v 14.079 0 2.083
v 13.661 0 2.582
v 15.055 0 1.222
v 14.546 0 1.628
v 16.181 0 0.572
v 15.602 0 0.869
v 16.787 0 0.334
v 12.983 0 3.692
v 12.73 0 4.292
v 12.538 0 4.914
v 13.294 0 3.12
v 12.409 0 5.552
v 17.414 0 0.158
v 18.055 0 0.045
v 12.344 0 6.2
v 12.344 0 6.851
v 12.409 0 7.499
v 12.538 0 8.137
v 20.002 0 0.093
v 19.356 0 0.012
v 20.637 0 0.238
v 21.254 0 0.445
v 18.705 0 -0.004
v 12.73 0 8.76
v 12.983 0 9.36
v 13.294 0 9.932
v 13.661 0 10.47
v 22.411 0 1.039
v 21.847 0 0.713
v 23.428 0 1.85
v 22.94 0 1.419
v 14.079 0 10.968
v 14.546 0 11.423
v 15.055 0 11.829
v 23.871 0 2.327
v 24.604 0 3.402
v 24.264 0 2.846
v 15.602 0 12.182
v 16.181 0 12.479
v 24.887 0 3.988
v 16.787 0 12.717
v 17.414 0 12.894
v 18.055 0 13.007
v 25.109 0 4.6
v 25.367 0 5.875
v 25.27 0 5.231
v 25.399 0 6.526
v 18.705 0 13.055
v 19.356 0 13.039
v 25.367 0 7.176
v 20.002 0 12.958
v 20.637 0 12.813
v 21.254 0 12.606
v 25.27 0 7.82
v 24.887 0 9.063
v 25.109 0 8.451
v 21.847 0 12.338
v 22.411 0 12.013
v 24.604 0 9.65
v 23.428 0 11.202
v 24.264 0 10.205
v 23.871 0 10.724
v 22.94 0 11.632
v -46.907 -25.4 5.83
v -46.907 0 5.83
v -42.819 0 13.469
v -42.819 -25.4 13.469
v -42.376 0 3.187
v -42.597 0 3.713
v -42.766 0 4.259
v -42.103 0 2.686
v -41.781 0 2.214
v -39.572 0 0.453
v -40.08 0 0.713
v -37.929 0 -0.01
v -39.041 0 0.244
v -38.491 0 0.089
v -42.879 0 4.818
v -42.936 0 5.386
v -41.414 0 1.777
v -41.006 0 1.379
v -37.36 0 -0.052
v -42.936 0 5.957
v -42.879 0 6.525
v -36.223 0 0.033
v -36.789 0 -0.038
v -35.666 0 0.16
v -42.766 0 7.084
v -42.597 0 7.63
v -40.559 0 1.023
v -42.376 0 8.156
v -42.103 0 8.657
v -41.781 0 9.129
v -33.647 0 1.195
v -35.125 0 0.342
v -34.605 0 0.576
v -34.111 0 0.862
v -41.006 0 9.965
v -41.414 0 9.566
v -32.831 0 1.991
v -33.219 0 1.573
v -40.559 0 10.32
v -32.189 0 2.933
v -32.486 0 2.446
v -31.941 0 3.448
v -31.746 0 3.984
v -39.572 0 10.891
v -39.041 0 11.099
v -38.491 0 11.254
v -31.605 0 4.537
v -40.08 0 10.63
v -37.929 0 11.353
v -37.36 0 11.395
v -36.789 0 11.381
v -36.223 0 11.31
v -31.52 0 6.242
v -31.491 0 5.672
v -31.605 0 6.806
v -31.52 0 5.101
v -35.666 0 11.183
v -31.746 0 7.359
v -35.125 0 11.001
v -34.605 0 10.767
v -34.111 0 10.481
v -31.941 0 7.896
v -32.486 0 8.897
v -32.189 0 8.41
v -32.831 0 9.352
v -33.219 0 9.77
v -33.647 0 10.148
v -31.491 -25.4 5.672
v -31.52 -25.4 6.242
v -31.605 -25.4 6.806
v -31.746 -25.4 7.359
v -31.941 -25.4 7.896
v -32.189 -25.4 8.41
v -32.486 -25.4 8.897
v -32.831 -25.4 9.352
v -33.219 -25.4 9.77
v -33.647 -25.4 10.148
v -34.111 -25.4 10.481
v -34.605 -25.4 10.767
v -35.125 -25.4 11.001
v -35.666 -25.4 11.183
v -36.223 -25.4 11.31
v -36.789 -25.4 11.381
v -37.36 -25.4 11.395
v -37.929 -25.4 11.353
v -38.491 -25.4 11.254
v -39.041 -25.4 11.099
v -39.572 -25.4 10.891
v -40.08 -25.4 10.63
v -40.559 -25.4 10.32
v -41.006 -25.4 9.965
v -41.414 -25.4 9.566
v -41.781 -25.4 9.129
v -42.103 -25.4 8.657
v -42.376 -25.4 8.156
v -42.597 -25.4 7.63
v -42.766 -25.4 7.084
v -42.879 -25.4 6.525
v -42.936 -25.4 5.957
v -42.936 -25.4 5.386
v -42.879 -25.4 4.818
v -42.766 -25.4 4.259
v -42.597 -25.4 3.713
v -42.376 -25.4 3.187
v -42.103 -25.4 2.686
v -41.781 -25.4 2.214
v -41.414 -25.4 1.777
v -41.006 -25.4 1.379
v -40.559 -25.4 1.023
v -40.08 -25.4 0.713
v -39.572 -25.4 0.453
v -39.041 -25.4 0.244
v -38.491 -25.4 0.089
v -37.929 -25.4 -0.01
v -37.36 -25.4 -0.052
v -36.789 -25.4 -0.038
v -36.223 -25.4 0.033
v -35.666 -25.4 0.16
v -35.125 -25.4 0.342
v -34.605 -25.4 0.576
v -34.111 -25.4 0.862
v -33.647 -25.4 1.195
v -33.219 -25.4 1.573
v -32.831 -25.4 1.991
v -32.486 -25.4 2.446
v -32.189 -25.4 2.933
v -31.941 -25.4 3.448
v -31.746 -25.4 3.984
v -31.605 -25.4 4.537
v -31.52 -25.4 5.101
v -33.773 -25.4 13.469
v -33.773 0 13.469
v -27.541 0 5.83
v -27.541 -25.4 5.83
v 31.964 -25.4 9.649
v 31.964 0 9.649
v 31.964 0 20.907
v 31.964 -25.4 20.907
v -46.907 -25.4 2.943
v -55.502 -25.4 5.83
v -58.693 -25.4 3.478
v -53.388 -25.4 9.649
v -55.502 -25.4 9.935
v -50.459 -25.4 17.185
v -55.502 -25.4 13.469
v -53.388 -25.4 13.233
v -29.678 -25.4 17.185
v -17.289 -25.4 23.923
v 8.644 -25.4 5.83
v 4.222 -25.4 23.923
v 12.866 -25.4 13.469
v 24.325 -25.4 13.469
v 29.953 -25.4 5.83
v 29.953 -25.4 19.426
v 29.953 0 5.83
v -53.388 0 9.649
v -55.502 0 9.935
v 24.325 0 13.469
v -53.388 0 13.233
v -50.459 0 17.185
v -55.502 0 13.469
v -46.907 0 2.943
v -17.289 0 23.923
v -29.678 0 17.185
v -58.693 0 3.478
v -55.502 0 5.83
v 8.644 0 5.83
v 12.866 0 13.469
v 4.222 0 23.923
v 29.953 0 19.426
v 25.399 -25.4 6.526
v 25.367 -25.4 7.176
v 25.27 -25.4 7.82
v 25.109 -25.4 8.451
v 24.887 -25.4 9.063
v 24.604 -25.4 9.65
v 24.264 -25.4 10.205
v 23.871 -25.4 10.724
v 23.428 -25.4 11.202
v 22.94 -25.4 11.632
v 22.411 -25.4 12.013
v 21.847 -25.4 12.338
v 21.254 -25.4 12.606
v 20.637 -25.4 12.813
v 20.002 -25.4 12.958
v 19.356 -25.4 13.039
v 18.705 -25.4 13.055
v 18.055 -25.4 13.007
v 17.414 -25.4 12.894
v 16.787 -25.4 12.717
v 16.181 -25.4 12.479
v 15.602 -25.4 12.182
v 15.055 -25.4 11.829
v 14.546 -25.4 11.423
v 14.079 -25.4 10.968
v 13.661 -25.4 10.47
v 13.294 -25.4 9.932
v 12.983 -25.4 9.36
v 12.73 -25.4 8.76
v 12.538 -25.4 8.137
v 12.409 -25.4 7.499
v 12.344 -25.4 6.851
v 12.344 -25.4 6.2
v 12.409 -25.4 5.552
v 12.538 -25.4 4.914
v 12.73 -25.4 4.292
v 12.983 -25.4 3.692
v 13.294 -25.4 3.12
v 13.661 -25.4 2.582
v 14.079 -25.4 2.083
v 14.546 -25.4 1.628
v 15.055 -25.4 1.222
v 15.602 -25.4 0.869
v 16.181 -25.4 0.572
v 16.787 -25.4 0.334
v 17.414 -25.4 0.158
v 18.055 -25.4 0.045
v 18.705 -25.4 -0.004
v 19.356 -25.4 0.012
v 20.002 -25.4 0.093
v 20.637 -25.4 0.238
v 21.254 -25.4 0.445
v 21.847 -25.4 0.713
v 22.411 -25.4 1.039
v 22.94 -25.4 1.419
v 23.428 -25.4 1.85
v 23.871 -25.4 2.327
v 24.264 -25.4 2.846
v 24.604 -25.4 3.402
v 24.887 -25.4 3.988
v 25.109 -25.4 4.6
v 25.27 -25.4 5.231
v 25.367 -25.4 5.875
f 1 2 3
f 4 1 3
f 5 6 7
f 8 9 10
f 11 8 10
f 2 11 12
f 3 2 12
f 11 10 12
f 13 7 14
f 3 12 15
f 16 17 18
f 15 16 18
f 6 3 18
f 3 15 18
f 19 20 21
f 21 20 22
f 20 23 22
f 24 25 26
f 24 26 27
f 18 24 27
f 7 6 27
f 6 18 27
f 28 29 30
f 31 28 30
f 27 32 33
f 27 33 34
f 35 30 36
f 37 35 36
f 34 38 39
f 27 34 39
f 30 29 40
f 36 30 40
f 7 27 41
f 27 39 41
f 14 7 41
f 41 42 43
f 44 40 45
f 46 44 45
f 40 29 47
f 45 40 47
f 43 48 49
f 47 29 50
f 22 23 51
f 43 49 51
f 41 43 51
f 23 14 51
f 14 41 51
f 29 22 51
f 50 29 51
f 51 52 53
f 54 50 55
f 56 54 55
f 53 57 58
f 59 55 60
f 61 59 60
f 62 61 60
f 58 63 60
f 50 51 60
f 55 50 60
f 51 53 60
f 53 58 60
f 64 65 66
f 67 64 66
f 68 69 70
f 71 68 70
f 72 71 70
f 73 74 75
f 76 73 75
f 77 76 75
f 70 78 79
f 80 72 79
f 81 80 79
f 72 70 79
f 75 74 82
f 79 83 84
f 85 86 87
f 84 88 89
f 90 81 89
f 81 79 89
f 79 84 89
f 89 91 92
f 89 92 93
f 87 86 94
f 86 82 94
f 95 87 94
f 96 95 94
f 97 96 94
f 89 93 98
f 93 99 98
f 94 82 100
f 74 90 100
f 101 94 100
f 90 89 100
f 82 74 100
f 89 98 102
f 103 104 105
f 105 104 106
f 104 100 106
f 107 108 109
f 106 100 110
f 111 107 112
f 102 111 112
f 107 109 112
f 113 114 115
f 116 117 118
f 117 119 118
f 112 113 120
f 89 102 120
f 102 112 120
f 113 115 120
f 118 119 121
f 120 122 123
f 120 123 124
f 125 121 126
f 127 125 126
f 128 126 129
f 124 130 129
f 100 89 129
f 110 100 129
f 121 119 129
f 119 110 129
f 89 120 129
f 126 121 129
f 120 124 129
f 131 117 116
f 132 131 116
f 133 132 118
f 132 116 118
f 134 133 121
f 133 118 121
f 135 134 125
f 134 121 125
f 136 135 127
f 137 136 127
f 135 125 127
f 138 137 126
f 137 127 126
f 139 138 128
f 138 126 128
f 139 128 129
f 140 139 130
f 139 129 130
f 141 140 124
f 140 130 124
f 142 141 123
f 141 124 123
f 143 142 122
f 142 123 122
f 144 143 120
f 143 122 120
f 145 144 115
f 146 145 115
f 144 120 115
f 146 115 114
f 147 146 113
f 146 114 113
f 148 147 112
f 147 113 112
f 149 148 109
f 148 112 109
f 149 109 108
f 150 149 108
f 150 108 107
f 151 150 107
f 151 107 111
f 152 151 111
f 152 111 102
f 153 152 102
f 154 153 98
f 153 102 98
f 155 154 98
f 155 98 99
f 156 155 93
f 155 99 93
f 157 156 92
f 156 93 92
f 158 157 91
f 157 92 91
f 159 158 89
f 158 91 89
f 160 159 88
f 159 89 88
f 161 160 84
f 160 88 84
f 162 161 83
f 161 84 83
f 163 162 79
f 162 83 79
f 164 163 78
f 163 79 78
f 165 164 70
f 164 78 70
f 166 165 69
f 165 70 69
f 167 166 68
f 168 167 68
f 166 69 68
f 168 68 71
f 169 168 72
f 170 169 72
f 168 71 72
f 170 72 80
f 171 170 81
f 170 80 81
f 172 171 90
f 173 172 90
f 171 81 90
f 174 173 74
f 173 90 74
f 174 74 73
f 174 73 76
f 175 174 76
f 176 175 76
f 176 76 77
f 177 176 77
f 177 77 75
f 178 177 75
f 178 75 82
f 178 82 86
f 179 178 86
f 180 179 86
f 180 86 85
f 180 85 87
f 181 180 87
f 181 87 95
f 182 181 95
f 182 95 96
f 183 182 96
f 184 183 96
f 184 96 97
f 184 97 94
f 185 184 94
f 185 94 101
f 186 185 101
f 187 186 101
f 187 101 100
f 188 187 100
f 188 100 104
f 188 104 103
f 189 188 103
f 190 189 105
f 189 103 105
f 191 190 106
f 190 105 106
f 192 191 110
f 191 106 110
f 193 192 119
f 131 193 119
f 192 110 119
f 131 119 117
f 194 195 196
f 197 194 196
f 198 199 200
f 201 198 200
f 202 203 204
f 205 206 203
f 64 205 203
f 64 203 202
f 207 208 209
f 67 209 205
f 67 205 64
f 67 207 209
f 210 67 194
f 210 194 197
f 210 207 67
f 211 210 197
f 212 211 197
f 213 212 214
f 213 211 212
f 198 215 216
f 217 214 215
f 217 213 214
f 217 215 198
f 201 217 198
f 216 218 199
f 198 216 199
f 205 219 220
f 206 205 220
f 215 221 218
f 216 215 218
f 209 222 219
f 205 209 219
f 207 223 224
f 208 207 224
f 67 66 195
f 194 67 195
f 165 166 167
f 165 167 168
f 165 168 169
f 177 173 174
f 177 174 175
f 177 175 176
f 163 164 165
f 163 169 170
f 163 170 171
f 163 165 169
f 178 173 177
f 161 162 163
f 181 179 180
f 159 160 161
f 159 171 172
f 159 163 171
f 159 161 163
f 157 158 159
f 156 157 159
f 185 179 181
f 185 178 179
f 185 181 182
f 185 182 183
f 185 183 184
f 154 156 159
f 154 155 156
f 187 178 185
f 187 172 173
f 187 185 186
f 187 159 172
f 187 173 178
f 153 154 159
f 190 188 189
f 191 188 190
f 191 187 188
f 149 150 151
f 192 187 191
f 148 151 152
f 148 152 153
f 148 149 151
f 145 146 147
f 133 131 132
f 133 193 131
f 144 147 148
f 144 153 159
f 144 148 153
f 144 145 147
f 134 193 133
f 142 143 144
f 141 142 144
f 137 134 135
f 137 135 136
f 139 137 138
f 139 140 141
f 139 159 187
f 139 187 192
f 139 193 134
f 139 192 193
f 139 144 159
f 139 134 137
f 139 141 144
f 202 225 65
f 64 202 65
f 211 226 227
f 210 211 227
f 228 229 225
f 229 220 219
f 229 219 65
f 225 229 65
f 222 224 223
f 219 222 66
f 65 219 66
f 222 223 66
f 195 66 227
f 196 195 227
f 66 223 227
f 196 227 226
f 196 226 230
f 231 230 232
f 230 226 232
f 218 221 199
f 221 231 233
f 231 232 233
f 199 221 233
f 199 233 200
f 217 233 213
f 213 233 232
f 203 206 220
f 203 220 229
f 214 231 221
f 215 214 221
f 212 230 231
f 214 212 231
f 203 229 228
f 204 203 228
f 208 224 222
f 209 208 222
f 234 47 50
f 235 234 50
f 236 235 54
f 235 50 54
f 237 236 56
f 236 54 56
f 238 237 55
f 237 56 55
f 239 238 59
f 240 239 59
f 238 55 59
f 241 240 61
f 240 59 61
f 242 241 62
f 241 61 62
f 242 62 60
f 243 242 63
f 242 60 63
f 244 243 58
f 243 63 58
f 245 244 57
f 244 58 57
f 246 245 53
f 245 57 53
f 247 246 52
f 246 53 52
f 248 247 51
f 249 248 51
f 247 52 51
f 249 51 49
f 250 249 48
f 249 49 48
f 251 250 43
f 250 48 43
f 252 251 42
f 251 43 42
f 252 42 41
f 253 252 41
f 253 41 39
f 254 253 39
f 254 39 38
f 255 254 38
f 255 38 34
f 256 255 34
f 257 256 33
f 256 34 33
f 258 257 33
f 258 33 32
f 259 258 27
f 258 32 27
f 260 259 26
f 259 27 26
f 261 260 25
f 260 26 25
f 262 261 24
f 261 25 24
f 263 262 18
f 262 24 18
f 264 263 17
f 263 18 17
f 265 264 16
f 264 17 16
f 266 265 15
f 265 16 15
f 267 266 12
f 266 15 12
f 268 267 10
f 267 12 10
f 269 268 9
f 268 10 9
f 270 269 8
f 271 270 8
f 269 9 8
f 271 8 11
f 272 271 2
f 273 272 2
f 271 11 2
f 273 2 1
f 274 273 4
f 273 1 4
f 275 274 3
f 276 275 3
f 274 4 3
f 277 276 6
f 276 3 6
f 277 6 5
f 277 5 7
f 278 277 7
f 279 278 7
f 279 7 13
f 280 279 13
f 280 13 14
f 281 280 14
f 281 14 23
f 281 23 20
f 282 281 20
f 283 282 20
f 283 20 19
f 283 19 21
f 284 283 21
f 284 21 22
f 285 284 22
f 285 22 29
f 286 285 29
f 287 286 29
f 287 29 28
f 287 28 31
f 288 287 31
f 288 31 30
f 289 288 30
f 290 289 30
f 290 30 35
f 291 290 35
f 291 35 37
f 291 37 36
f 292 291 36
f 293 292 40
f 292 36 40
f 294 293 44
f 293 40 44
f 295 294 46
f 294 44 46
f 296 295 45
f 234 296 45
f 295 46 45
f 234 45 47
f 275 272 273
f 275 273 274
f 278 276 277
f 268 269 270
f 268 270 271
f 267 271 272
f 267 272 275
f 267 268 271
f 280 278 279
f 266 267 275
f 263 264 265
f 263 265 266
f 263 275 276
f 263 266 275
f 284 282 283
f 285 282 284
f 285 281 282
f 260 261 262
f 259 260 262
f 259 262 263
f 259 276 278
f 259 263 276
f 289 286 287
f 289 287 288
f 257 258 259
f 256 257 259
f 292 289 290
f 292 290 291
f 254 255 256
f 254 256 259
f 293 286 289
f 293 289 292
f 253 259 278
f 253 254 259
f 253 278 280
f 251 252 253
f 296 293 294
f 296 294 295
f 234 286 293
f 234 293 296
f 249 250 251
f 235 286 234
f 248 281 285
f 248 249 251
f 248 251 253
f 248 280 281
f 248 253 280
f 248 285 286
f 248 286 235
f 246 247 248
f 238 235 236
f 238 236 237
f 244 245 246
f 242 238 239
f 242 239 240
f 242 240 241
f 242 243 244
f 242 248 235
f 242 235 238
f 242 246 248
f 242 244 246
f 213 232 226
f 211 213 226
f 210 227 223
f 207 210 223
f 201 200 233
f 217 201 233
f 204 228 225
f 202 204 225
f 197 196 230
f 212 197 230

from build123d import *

# Parameters (mm, degrees)
F1_DEPTH = 25.4
F2_R     = 5.725648
F3_DEPTH = 25.4
F4_R     = 6.531804
F5_DEPTH = 25.4


with BuildPart() as f1:
    # F0 (on Front) → F1 (new body)
    with BuildSketch(Plane.XZ):
        Polygon((-46.907243, 5.829874), (-42.819422, 13.469021), (-33.773065, 13.469021), (-27.541131, 5.829874), (8.644298, 5.829874), (12.865931, 13.469021), (24.324648, 13.469021), (29.953493, 5.829874), (31.963792, 9.649448), (31.963792, 13.469021), (31.963792, 20.907136), (29.953493, 19.425863), (4.221634, 23.922589), (-17.288594, 23.922589), (-29.678462, 17.184902), (-50.458569, 17.184902), (-55.501551, 13.469021), (-53.388081, 13.232813), (-53.388081, 9.649448), (-55.501551, 9.934837), (-55.501551, 5.829874), (-58.692792, 3.478433), (-46.907243, 2.943043), align=None)
    extrude(amount=F1_DEPTH)


with BuildPart() as f3:
    # F2 (on Front) → F3 (new body)
    with BuildSketch(Plane.XZ):
        with Locations((-37.217036, 5.671549)):
            Circle(F2_R)
    extrude(amount=F3_DEPTH)


with BuildPart() as f5:
    # F4 (on Front) → F5 (new body)
    with BuildSketch(Plane.XZ):
        with Locations((18.867608, 6.525639)):
            Circle(F4_R)
    extrude(amount=F5_DEPTH)


solid = Compound([f1.part, f3.part, f5.part])
